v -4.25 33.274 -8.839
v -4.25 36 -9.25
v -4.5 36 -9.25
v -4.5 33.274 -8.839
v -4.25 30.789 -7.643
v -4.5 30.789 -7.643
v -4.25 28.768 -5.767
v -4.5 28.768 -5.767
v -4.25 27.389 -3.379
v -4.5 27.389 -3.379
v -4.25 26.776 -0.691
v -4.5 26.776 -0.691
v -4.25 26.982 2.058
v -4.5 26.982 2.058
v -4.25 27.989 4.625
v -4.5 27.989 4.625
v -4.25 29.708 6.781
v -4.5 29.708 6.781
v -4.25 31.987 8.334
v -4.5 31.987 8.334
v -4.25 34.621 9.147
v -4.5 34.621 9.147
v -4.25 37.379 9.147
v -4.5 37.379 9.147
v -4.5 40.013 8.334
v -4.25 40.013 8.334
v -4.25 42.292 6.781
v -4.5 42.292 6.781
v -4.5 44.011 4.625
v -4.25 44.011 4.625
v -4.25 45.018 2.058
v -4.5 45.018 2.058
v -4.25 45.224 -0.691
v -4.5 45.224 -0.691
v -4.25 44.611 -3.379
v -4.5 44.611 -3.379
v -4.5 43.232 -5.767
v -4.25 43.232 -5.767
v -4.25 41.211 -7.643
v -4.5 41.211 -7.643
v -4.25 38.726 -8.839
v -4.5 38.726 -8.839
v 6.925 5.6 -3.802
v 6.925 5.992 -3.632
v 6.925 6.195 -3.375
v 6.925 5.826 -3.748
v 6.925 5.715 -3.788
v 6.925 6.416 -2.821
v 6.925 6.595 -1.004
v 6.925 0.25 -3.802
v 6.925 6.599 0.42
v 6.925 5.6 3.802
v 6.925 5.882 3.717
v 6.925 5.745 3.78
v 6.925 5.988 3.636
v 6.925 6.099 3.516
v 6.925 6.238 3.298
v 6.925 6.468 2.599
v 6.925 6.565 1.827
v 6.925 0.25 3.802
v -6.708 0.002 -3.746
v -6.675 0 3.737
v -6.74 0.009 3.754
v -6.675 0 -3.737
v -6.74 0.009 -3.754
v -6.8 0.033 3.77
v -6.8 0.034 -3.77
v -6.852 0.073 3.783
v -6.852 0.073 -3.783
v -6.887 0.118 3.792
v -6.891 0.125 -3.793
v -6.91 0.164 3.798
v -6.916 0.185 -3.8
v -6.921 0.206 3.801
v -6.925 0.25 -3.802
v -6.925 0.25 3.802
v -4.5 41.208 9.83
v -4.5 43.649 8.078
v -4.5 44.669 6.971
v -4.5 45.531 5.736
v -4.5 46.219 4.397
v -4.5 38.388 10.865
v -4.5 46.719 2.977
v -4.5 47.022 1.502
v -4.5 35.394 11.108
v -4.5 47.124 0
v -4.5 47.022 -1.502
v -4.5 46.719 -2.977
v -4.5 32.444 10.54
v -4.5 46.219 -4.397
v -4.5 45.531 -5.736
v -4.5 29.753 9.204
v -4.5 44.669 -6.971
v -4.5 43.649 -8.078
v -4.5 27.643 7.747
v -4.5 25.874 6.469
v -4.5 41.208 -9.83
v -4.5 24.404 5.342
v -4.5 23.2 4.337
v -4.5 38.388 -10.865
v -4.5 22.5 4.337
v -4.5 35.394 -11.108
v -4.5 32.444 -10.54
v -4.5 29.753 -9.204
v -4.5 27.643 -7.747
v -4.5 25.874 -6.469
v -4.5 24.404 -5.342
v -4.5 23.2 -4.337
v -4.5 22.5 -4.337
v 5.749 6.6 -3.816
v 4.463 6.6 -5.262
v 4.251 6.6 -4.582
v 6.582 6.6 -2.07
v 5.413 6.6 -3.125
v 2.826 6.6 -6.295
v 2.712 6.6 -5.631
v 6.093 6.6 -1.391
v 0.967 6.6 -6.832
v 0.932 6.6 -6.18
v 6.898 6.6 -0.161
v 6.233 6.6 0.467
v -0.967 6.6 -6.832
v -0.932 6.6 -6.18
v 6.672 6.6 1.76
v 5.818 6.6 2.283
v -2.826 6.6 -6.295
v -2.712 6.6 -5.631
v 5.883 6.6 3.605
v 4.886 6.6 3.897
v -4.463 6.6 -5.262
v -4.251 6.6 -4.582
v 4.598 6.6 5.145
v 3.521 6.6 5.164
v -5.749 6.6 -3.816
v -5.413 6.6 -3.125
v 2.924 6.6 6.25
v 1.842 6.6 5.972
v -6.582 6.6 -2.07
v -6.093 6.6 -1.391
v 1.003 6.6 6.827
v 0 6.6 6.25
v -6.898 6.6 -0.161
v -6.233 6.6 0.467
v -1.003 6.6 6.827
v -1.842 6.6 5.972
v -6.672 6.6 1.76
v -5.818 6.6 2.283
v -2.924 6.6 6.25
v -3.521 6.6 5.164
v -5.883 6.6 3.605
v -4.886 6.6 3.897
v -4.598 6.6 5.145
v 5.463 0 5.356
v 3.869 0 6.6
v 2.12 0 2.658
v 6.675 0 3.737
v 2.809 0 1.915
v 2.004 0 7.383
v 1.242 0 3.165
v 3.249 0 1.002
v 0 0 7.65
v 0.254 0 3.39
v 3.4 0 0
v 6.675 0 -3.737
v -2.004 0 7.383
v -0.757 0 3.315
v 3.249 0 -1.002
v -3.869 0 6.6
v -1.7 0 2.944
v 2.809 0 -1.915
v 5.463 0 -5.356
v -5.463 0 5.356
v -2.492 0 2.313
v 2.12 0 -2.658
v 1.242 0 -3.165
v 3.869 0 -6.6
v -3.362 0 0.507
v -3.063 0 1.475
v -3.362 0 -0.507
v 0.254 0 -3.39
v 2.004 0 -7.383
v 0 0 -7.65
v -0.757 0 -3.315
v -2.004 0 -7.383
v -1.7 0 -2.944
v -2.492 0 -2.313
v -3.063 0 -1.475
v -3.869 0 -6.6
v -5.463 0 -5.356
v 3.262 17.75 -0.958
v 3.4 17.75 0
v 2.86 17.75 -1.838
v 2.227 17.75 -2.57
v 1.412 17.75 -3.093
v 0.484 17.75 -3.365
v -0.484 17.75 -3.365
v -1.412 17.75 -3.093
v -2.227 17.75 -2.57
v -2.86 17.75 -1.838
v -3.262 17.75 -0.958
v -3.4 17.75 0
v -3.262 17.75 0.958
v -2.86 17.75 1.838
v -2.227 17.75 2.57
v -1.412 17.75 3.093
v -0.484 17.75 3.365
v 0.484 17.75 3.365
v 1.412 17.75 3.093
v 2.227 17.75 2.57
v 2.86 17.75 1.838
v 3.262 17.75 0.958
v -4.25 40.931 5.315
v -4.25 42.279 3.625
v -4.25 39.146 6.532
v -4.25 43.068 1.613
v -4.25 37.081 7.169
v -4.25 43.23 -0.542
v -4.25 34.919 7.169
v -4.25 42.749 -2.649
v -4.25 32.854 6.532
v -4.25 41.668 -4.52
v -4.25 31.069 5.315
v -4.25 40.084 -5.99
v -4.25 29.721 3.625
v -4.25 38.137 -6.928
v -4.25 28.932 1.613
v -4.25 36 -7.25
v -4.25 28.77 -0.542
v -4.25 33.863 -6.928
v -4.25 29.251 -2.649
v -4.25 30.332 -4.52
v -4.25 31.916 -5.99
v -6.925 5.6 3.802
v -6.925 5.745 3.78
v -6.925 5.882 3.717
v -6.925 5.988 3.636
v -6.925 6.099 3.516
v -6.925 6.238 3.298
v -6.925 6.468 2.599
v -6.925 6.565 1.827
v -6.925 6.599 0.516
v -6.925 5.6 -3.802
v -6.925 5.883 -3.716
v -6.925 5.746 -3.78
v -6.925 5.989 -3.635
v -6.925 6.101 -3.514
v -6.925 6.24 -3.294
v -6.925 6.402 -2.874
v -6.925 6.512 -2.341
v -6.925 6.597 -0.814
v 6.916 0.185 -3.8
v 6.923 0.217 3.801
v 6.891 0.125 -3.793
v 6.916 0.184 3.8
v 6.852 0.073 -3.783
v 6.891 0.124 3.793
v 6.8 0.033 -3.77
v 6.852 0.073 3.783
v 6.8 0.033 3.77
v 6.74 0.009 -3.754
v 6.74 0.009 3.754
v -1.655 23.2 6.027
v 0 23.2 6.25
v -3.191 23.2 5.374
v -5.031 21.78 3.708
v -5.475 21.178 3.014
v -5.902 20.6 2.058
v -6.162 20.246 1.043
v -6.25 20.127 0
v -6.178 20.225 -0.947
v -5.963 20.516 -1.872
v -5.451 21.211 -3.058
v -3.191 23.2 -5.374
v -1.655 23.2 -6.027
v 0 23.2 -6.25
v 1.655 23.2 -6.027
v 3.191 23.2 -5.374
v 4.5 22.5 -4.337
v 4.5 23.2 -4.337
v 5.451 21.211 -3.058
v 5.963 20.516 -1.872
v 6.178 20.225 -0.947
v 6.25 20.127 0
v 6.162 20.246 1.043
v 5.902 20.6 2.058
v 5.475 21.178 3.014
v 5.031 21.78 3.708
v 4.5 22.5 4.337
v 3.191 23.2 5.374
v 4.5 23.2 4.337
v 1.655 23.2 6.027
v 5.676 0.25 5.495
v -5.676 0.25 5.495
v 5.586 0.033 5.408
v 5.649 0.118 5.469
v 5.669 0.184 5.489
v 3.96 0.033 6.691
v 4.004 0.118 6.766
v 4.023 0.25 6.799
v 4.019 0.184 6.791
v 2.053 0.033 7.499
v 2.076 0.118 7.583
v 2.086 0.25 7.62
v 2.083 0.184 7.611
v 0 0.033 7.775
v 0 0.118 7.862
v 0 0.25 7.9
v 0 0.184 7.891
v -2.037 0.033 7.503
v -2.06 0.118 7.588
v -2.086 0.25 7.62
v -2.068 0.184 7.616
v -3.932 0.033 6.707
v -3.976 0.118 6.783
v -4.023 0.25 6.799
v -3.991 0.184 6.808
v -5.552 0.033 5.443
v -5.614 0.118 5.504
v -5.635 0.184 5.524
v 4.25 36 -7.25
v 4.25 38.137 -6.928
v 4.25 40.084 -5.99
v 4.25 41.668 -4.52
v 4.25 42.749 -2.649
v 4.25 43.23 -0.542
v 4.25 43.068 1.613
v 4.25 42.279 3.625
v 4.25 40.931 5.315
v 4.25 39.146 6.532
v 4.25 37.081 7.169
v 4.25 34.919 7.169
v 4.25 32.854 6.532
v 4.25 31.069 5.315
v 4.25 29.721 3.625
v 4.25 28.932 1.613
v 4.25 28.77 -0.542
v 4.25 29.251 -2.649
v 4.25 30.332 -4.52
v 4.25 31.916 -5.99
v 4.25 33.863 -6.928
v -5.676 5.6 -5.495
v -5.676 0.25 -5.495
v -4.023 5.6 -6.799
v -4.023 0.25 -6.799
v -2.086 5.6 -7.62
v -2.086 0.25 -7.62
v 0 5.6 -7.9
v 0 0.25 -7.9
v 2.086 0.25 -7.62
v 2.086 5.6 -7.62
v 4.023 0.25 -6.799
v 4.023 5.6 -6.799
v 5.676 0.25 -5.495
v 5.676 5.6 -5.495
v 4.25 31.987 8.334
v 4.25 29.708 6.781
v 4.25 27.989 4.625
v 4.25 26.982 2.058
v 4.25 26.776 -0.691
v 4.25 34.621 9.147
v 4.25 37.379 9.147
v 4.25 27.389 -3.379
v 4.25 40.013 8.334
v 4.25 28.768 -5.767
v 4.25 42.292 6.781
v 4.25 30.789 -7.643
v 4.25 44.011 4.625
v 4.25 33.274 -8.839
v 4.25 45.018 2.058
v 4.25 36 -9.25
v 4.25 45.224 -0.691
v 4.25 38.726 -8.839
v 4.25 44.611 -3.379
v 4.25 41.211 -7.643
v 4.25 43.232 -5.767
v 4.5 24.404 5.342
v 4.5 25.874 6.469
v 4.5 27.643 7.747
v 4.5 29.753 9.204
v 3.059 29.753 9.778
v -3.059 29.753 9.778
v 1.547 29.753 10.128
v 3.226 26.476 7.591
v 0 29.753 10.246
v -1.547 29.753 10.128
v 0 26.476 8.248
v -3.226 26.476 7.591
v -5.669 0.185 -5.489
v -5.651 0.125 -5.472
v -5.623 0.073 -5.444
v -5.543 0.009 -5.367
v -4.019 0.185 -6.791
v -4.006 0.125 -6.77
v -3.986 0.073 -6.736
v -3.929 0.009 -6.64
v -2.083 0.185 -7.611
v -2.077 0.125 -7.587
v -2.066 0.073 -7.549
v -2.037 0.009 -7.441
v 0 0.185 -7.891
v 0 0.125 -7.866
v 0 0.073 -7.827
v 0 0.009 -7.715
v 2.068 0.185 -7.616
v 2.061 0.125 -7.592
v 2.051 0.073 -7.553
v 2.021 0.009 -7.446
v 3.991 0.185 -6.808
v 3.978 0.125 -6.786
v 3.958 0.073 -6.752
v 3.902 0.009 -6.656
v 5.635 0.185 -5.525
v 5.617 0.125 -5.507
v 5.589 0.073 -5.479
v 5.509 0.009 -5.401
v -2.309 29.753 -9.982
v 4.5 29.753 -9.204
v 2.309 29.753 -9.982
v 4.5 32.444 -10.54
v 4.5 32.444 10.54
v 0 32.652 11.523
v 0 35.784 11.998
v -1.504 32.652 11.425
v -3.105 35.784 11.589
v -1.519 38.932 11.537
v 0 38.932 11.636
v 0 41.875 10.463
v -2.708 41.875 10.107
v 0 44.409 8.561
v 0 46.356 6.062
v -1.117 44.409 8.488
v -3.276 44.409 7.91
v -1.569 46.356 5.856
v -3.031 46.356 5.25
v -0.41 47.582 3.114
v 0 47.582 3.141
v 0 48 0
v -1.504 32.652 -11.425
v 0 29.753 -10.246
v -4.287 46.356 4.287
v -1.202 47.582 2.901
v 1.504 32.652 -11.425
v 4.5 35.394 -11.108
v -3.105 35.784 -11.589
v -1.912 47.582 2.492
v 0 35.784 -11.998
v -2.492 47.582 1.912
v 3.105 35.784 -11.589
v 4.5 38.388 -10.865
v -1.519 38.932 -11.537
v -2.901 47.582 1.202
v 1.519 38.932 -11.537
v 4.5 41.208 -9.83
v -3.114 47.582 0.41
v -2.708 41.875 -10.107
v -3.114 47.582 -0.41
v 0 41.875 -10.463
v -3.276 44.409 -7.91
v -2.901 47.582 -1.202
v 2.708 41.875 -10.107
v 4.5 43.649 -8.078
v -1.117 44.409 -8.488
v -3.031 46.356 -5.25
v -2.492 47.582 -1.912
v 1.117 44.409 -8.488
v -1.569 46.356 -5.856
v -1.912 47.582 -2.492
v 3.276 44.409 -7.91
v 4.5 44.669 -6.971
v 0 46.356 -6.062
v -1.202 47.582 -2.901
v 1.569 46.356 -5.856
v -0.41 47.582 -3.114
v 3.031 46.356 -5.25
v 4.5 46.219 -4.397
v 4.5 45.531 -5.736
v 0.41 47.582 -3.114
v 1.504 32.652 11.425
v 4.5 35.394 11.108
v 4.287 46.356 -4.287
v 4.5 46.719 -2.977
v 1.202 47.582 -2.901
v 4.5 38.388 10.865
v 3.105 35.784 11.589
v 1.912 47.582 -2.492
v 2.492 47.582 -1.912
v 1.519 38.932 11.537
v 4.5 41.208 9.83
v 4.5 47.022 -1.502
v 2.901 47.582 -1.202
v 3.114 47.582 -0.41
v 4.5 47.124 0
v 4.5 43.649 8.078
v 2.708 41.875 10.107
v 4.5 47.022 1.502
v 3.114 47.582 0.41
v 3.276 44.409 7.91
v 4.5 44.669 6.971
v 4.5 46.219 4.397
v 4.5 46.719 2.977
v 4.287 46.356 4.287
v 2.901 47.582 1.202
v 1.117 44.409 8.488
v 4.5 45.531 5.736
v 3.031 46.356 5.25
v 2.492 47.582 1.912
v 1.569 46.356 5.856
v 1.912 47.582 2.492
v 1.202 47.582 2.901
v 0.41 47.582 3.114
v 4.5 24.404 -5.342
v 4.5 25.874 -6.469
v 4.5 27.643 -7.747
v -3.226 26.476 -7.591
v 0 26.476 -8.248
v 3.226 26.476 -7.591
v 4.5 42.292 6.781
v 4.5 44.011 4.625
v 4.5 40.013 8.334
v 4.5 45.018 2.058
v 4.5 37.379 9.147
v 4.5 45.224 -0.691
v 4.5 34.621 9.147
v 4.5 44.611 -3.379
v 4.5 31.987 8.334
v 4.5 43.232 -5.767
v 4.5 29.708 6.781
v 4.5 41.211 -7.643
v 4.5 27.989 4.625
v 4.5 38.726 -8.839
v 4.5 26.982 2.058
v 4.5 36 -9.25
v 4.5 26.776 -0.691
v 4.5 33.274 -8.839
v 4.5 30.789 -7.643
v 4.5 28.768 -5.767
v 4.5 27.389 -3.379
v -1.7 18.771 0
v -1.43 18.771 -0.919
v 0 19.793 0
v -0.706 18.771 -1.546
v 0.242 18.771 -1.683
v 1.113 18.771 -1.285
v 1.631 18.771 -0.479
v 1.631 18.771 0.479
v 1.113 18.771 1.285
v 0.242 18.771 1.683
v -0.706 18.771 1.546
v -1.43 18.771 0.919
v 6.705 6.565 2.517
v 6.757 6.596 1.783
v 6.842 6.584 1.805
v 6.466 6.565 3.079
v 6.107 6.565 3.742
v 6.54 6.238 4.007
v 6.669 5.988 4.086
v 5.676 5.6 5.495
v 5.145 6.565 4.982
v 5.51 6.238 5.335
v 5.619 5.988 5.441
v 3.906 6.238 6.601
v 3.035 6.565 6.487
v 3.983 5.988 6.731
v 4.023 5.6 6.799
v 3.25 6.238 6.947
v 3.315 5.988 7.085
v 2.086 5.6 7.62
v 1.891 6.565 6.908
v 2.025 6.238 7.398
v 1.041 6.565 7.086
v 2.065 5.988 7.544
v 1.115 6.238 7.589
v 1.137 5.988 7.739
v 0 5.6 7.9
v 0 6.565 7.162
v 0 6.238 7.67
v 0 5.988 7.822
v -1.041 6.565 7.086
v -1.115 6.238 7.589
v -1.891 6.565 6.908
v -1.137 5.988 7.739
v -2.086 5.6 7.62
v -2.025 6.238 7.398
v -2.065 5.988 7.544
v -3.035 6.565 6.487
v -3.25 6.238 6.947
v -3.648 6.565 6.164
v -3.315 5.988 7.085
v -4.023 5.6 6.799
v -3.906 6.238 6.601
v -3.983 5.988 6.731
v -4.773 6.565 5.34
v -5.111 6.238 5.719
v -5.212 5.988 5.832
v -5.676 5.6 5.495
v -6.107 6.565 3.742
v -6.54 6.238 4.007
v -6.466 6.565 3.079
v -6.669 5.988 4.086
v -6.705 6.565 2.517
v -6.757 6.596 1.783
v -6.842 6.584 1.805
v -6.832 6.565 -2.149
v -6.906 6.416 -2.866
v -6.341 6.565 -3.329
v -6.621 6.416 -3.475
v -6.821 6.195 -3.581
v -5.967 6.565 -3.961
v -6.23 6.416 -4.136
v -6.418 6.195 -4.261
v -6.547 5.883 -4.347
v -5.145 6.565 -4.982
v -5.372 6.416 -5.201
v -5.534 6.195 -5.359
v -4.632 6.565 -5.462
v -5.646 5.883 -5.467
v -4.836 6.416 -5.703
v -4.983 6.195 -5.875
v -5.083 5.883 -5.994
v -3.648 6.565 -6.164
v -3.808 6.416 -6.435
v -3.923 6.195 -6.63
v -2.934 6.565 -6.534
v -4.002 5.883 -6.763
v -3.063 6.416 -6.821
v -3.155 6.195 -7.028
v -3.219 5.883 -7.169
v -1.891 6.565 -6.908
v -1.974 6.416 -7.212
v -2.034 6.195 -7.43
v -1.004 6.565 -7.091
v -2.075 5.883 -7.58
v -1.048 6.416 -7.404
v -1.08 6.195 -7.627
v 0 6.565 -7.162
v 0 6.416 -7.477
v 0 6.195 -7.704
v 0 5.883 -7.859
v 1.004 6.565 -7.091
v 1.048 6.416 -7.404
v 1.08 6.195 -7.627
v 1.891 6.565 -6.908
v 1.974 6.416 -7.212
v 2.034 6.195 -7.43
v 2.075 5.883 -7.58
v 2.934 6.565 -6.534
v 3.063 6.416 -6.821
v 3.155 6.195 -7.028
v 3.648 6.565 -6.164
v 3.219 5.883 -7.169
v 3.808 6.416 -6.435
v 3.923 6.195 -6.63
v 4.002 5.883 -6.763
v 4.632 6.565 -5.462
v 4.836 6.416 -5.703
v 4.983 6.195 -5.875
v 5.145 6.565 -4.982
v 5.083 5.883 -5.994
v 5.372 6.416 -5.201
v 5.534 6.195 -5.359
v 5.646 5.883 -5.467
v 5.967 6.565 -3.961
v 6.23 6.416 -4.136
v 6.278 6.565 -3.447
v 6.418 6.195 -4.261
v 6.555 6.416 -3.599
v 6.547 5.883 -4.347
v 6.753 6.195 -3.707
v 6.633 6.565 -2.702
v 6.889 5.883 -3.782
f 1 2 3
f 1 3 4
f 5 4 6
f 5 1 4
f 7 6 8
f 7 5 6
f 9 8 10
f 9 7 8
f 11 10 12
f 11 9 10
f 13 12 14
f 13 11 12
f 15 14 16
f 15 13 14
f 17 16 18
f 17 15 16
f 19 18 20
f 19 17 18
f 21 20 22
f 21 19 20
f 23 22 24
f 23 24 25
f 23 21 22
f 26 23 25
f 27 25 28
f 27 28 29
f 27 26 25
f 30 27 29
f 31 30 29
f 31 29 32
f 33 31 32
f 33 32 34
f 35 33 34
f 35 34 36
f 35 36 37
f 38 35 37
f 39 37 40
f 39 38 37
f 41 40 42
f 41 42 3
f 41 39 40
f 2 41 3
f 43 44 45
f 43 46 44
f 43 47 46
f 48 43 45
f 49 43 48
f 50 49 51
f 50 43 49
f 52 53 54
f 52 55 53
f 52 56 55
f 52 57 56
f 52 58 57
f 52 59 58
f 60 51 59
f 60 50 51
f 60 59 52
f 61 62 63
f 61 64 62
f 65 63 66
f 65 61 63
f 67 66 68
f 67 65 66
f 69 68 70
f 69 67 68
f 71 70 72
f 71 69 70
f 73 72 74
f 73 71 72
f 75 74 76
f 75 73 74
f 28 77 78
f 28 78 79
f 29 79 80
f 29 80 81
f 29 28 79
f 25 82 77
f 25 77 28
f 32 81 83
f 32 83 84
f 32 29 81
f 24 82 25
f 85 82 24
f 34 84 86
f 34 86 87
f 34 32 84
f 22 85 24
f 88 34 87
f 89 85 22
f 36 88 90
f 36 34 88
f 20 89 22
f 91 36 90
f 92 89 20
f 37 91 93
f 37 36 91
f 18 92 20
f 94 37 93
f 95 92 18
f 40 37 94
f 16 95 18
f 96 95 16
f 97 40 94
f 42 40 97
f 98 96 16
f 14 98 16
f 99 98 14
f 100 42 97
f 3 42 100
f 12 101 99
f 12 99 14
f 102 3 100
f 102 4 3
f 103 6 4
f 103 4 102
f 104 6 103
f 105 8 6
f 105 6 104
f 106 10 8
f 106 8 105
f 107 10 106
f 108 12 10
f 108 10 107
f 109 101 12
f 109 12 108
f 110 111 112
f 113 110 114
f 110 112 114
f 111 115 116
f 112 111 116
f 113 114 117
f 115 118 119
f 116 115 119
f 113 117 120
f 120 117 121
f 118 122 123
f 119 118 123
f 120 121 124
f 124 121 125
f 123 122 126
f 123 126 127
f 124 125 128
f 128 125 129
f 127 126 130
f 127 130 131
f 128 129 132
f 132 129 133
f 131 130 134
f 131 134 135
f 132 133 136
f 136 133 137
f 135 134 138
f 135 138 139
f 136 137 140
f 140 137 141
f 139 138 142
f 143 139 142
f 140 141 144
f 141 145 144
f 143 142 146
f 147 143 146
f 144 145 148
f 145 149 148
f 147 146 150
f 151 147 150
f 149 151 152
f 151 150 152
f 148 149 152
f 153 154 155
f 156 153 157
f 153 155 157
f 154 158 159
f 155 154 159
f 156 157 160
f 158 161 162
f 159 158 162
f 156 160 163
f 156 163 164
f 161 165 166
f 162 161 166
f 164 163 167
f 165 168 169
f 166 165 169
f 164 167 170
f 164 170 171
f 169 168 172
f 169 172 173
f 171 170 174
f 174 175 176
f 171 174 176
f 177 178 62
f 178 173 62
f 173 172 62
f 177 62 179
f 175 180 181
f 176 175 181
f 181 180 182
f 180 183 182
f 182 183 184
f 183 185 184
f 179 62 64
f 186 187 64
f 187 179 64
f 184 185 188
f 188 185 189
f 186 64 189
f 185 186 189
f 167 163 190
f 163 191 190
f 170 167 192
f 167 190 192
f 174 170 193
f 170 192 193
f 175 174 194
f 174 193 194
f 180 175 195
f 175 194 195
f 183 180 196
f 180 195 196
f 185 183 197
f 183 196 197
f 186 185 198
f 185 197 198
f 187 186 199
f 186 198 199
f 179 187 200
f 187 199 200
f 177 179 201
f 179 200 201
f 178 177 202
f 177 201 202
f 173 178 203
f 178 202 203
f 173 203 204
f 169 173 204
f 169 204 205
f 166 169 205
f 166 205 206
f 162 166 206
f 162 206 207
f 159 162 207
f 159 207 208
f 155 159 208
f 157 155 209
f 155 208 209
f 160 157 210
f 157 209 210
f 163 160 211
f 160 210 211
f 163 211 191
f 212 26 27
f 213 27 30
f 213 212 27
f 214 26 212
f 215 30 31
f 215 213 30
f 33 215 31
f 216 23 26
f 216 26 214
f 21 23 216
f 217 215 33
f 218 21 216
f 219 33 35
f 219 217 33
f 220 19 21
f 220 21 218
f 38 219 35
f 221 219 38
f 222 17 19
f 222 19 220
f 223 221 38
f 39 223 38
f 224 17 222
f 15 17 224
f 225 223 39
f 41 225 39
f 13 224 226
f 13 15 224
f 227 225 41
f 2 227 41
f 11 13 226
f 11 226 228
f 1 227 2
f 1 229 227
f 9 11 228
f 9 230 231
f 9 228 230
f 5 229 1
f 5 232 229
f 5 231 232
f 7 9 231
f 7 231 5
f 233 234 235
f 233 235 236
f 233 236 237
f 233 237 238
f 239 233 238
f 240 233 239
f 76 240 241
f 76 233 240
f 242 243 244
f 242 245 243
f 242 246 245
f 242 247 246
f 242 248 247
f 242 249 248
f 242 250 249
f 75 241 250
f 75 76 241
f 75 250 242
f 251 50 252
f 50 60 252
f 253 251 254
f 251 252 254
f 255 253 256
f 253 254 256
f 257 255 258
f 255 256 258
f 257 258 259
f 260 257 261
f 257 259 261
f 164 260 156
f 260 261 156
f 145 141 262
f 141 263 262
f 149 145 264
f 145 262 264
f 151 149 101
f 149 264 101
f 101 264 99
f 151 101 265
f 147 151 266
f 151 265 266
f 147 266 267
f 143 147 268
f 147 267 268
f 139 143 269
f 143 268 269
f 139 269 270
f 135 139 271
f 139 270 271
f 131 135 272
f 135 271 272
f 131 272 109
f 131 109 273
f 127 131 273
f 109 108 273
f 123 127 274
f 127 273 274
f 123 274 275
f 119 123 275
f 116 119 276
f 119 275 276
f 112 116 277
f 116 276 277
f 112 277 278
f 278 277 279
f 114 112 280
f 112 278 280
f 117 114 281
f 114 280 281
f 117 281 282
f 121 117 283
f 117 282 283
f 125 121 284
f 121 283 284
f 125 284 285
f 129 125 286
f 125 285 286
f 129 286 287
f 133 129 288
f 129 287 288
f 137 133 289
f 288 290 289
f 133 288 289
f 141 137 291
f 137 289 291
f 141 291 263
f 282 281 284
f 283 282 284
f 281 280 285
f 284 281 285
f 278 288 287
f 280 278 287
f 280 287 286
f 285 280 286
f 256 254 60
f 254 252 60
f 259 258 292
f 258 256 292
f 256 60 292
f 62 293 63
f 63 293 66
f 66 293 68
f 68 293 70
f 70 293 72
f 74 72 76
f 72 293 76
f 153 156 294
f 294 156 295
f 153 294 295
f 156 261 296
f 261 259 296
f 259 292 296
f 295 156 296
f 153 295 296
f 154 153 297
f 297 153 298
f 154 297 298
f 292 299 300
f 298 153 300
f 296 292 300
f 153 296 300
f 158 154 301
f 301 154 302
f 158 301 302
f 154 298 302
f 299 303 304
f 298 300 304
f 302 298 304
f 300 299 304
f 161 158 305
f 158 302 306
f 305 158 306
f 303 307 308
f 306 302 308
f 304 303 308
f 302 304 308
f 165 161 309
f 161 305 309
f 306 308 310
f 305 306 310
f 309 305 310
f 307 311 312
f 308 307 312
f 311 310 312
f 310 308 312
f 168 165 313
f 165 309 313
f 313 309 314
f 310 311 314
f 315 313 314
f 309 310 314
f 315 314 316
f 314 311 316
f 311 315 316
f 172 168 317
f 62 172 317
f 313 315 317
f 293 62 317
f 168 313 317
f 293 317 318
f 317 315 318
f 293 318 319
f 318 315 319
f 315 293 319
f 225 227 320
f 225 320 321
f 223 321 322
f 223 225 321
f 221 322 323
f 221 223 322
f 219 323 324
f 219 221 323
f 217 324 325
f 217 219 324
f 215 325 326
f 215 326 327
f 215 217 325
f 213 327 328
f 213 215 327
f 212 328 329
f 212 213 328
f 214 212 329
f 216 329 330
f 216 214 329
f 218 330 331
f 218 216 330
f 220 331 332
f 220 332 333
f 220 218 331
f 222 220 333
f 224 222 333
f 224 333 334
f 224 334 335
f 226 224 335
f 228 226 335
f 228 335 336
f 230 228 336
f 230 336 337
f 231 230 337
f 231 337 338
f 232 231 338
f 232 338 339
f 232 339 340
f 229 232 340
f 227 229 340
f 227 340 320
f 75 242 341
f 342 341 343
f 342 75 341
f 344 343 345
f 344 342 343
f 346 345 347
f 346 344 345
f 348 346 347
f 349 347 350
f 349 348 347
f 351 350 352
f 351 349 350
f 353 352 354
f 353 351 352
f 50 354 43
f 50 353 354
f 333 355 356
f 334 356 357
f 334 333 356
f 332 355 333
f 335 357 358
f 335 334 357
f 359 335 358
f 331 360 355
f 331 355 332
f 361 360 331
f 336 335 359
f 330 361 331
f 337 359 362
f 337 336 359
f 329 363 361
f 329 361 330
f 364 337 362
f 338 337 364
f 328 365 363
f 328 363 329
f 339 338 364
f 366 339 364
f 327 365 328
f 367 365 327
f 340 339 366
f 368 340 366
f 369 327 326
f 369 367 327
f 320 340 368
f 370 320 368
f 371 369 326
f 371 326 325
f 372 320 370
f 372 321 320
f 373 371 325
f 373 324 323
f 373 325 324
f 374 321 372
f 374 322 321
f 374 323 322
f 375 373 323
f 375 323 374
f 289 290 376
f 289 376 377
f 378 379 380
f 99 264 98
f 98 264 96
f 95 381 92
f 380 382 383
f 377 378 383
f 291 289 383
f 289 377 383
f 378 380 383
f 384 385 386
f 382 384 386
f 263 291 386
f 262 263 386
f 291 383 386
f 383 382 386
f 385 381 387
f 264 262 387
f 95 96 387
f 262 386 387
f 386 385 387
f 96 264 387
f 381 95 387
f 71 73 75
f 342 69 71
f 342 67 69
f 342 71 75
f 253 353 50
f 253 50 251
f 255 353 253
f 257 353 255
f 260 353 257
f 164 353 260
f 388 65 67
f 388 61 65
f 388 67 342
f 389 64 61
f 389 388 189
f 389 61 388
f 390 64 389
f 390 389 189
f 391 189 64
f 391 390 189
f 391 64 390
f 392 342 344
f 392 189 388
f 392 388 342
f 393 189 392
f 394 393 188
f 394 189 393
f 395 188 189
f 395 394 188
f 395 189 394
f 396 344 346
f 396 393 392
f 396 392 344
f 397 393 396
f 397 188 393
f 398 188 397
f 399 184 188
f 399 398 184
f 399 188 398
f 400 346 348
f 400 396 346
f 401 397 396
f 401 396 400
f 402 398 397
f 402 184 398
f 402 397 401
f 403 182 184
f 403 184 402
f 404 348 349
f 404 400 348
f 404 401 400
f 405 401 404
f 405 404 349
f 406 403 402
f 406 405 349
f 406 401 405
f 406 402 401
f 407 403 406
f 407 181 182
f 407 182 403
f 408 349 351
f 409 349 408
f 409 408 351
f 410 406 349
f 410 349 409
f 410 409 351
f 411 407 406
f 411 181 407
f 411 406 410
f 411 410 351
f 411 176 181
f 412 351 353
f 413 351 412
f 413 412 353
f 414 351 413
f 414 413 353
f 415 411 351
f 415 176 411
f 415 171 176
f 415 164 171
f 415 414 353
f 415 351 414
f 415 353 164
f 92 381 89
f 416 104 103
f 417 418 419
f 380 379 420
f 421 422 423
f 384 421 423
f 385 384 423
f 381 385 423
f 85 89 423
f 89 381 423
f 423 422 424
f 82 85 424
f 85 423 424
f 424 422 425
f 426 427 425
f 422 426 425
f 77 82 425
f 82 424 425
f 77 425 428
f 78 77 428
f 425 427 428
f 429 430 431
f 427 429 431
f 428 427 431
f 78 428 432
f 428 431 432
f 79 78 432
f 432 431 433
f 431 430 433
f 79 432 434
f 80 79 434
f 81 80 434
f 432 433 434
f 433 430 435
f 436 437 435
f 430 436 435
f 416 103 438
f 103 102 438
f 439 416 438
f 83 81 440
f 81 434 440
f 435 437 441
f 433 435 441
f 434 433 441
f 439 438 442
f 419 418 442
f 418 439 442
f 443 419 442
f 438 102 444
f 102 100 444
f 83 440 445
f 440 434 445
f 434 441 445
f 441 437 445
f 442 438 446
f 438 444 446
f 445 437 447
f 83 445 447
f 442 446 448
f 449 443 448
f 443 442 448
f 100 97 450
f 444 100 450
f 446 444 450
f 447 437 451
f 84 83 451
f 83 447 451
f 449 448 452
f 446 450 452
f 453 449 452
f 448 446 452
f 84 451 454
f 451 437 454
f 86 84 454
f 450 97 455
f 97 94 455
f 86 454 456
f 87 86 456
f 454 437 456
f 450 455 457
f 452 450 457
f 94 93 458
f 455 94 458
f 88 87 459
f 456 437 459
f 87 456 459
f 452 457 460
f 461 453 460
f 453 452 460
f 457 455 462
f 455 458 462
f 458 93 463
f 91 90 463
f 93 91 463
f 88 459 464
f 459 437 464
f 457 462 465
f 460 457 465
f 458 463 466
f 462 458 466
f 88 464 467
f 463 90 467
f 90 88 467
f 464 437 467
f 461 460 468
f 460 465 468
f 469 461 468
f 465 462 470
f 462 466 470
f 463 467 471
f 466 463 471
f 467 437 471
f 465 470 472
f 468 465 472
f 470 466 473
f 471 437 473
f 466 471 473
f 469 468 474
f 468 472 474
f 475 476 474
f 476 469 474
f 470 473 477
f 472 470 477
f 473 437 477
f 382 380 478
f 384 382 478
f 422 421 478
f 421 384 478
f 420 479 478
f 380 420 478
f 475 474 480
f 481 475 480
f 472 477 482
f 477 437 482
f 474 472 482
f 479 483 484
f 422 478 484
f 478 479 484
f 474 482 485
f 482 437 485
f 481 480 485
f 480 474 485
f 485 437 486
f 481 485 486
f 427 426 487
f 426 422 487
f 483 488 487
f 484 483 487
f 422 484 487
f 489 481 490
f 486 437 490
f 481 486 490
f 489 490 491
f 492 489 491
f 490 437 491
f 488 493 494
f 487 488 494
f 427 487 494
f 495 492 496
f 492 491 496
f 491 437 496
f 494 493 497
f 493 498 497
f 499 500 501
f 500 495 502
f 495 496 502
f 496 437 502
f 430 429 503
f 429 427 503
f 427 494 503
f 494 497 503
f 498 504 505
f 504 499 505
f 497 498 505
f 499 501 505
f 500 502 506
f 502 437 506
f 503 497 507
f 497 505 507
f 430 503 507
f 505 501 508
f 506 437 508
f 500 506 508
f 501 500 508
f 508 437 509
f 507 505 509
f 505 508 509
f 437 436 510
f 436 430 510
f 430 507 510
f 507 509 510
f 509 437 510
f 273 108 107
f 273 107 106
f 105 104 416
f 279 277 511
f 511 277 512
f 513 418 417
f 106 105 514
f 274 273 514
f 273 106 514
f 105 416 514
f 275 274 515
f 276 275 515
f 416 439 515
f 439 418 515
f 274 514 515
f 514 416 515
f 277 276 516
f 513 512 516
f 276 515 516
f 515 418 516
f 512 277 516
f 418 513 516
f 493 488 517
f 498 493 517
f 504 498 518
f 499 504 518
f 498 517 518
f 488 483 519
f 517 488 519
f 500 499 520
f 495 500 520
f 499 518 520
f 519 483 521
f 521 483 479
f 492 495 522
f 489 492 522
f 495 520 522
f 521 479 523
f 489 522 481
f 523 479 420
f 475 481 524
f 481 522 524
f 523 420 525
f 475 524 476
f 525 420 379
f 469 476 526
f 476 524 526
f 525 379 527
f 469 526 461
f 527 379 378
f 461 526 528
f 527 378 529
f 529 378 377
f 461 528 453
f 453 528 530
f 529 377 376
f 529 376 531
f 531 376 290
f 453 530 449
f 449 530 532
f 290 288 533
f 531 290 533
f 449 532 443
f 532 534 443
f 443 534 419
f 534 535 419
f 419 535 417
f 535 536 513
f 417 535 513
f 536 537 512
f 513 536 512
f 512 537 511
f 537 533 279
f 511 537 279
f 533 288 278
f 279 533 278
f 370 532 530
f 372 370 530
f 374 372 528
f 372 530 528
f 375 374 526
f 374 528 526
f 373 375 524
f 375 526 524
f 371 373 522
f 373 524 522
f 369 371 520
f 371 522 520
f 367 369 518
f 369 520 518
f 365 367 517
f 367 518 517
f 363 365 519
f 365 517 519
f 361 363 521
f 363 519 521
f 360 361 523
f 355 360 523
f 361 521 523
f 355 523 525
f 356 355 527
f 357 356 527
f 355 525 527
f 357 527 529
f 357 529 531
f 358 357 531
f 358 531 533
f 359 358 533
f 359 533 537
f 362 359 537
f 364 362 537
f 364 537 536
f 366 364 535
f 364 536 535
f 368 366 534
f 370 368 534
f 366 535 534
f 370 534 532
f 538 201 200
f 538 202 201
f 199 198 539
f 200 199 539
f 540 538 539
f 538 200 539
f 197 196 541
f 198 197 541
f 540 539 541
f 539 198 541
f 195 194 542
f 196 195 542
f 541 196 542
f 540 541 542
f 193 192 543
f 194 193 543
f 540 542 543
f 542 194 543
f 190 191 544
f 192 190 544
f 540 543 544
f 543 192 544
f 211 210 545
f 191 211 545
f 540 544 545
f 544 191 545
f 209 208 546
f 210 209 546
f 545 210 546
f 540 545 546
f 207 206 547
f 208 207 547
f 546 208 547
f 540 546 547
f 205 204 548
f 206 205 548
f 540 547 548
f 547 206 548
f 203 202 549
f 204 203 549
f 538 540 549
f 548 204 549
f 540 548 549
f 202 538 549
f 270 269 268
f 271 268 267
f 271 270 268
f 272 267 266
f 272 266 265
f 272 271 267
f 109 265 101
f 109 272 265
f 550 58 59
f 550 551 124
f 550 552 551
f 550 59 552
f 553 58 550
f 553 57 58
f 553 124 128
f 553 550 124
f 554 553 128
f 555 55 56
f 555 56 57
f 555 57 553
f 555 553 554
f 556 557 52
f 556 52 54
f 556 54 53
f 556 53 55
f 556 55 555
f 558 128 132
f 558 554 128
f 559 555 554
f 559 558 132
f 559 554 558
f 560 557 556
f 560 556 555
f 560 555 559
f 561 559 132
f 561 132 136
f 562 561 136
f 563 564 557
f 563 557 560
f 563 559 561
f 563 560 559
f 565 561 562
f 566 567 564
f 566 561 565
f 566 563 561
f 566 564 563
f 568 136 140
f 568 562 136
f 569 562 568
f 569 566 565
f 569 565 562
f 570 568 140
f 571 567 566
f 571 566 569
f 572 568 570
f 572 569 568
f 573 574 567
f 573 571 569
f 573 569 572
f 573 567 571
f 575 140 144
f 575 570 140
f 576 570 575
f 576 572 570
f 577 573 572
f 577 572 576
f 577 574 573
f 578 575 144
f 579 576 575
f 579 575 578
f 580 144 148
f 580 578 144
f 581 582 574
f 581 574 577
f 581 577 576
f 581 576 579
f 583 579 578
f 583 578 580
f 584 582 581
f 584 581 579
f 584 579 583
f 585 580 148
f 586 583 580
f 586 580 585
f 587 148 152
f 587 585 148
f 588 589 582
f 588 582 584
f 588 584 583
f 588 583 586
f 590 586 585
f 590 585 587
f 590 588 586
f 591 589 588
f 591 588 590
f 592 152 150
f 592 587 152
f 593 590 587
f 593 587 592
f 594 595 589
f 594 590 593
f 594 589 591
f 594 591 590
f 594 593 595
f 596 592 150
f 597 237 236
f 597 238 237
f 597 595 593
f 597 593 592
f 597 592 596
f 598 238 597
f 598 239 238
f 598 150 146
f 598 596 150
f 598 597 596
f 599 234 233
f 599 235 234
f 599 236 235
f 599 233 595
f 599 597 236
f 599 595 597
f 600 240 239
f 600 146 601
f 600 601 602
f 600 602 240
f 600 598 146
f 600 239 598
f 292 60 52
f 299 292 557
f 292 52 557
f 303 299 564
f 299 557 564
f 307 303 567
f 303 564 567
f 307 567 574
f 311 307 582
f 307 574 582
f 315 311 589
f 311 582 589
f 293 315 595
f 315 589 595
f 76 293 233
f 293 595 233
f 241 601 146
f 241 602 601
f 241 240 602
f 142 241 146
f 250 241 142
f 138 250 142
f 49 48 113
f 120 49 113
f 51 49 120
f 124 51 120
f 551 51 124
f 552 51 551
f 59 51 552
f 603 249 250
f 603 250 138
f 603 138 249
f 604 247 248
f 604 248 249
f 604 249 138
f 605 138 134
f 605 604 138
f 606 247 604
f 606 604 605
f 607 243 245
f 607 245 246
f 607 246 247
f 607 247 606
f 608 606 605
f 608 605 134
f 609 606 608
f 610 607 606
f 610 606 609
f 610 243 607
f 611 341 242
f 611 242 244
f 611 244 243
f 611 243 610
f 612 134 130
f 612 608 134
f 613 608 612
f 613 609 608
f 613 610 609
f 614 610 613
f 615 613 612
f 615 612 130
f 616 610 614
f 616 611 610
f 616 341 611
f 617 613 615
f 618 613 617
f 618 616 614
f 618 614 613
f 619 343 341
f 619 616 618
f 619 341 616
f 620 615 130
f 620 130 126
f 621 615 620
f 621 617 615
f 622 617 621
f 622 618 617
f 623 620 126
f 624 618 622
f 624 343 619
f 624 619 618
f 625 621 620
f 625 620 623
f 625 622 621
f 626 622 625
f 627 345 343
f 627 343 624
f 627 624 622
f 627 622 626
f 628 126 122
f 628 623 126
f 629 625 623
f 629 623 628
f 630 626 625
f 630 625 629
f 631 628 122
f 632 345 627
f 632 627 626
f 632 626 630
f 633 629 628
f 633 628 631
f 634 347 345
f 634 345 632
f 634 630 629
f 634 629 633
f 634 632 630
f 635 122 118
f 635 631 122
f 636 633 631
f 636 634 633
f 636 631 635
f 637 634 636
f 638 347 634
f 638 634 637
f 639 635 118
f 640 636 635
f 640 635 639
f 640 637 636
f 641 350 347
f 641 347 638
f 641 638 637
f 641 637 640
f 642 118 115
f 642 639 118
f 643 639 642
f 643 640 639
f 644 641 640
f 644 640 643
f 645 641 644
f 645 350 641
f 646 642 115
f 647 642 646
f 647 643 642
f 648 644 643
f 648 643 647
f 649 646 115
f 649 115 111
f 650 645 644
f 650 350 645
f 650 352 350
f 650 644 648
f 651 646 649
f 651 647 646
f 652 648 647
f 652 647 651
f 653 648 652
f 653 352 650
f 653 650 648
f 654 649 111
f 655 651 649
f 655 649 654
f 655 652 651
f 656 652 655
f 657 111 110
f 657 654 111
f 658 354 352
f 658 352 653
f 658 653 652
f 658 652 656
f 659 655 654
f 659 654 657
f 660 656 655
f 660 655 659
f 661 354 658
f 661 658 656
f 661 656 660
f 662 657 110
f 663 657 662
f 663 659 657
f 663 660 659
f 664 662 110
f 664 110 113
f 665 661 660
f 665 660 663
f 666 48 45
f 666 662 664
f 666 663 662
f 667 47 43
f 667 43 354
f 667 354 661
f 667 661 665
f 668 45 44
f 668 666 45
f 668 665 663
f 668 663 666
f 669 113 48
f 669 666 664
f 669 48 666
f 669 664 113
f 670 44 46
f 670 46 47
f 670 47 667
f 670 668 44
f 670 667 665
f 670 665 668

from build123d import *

# Parameters (mm, degrees)
SKETCH2_OUTSIDE_W        = 37.758
SKETCH2_OUTSIDE_H        = 37.758
CUT_EXTRUDE1_DEPTH       = 6.6
SKETCH3_OUTSIDE_W        = 37.758
SKETCH3_OUTSIDE_H        = 37.758
SKETCH3_OUTSIDE_W_2      = 9
SKETCH3_OUTSIDE_H_2      = 24
CUT_EXTRUDE2_DEPTH       = 31.630866785
SKETCH4_R                = 9.25
SKETCH4_R_2              = 7.25
CUT_EXTRUDE3_DEPTH       = 0.25
CUT_EXTRUDE4_START       = -0.25
SKETCH5_R                = 9.25
SKETCH5_R_2              = 7.25
CUT_EXTRUDE4_DEPTH       = 0.25
DOME2_FACE_RADIUS        = 7.25
DOME2_HEIGHT             = 3.8
FILLET1_R                = 1
FILLET2_R                = 0.25
CUT_EXTRUDE10_DEPTH      = 10.2995
M8_TAPPED_HOLE1_D        = 6.8
M8_TAPPED_HOLE1_DEPTH    = 22.25
M8_TAPPED_HOLE1_TIP      = 2.042926105
CUT_EXTRUDE11_DEPTH      = 51.168615687
CUT_EXTRUDE11_DEPTH_BACK = 51.168615687
SKETCH6_R                = 7.25


# Read off the part's stored shape, not the designer's step: Dome1
with BuildPart() as part:
    # Sketch1 → Revolve1 (revolve)
    with BuildSketch(Plane(origin=(0, 0, 0), x_dir=(0, 0, -1), z_dir=(1, 0, 0)), mode=Mode.PRIVATE) as revolve1_sk:
        with BuildLine():
            Line((0, 0), (7.9, 0))
            Line((7.9, 0), (7.9, 6.6))
            Line((7.9, 6.6), (6.25, 6.6))
            Line((6.25, 6.6), (6.25, 23.2))
            Line((6.25, 23.2), (10.245555029, 29.752712416))
            ThreePointArc((10.245555029, 29.752712416), (10.463447114, 41.875055276), (0, 48))
            Line((0, 48), (0, 0))
        make_face()
    revolve(revolve1_sk.sketch.rotate(Axis((0, 48, 0), (0, -1, 0)), 180), axis=Axis((0, 48, 0), (0, -1, 0)))

    # Sketch2 outside → Cut-Extrude1 (cut)
    with BuildSketch(Plane(origin=(0, 0, 0), x_dir=(-1, 0, 0), z_dir=(0, -1, 0))):
        Rectangle(SKETCH2_OUTSIDE_W, SKETCH2_OUTSIDE_H)
        with BuildLine():
            Line((-6.925, 3.801890977), (-6.925, -3.801890977))
            ThreePointArc((-6.925, -3.801890977), (0, -7.9), (6.925, -3.801890977))
            Line((6.925, -3.801890977), (6.925, 3.801890977))
            ThreePointArc((6.925, 3.801890977), (0, 7.9), (-6.925, 3.801890977))
        make_face(mode=Mode.SUBTRACT)
    extrude(amount=-CUT_EXTRUDE1_DEPTH, mode=Mode.SUBTRACT)

    # Sketch3 outside → Cut-Extrude2 (cut, through all)
    with BuildSketch(Plane(origin=(0, 22.5, 0), x_dir=(-1, 0, 0), z_dir=(0, -1, 0))):
        Rectangle(SKETCH3_OUTSIDE_W, SKETCH3_OUTSIDE_H)
        Rectangle(SKETCH3_OUTSIDE_W_2, SKETCH3_OUTSIDE_H_2, mode=Mode.SUBTRACT)
    extrude(amount=-CUT_EXTRUDE2_DEPTH, mode=Mode.SUBTRACT)

    # Sketch4 → Cut-Extrude3 (cut)
    with BuildSketch(Plane(origin=(4.5, 0, 0), x_dir=(0, 0, -1), z_dir=(1, 0, 0))):
        with Locations((0, 36)):
            Circle(SKETCH4_R)
        with Locations((0, 36)):
            Circle(SKETCH4_R_2, mode=Mode.SUBTRACT)
    extrude(amount=-CUT_EXTRUDE3_DEPTH, mode=Mode.SUBTRACT)

    # Sketch5 → Cut-Extrude4 (cut)
    with BuildSketch(Plane.ZY.offset(4.5).offset(CUT_EXTRUDE4_START)):
        with Locations(Location((0, 36, 0), (0, 0, 180))):
            Circle(SKETCH5_R)
        with Locations(Location((0, 36, 0), (0, 0, 180))):
            Circle(SKETCH5_R_2, mode=Mode.SUBTRACT)
    extrude(amount=CUT_EXTRUDE4_DEPTH, mode=Mode.SUBTRACT)

    # Dome1 outline → Dome1 (revolve)
    with BuildSketch(Plane(origin=(0, 36, 0), x_dir=(0, 1, 0), z_dir=(0, 0, -1))):
        with BuildLine():
            Line((0, -4.499999993), (0, -8.3))
            ThreePointArc((0, -8.3), (4.092752745, -7.292422991), (7.250000005, -4.499999993))
            Line((7.250000005, -4.499999993), (0, -4.499999993))
        make_face()
    revolve(axis=Axis((0, 36, 0), (1, 0, 0)))

    # Dome2: a dome of height H over a round flat face of radius A is a cap of a sphere of radius (A * A + H * H) / (2 * H)
    dome2_r = (DOME2_FACE_RADIUS * DOME2_FACE_RADIUS + DOME2_HEIGHT * DOME2_HEIGHT) / (2 * DOME2_HEIGHT)
    dome2_base = Plane((4.5, 36, 0), z_dir=(1, 0, 0))
    with Locations(dome2_base.offset(DOME2_HEIGHT - dome2_r)):
        dome2_ball = Sphere(dome2_r, mode=Mode.PRIVATE)
    add(split(dome2_ball, bisect_by=dome2_base, keep=Keep.TOP, mode=Mode.PRIVATE))

    # Fillet1
    # the kernel refuses this fillet: 1 mm, written as the material it takes off along each edge
    with BuildSketch(Plane(origin=(0, 6.6, 0), x_dir=(-0.9669082627273712, 0, 0.25512430591681584), z_dir=(0.25512430591681584, 0, 0.9669082627273712))) as fillet1_piece_1:
        with BuildLine():
            CenterArc((7.9 - FILLET1_R, FILLET1_R), FILLET1_R, 270, 90)
            Line((7.9, FILLET1_R), (7.9 + FILLET1_R * 0.02, FILLET1_R))
            Line((7.9 + FILLET1_R * 0.02, FILLET1_R), (7.9 + FILLET1_R * 0.02, -FILLET1_R * 0.02))
            Line((7.9 + FILLET1_R * 0.02, -FILLET1_R * 0.02), (7.9 - FILLET1_R, -FILLET1_R * 0.02))
            Line((7.9 - FILLET1_R, -FILLET1_R * 0.02), (7.9 - FILLET1_R, 0))
        make_face()
    revolve(axis=Axis((0, 6.6, 0), (0, -1, 0)), revolution_arc=209.561901965, mode=Mode.SUBTRACT)
    with BuildSketch(Plane(origin=(0, 6.6, 0), x_dir=(-0.9669082627273712, 0, -0.2551243059168157), z_dir=(0.2551243059168157, 0, -0.9669082627273712))) as fillet1_piece_2:
        with BuildLine():
            CenterArc((7.9 - FILLET1_R, -FILLET1_R), FILLET1_R, 360, 90)
            Line((7.9, -FILLET1_R), (7.9 + FILLET1_R * 0.02, -FILLET1_R))
            Line((7.9 + FILLET1_R * 0.02, -FILLET1_R), (7.9 + FILLET1_R * 0.02, FILLET1_R * 0.02))
            Line((7.9 + FILLET1_R * 0.02, FILLET1_R * 0.02), (7.9 - FILLET1_R, FILLET1_R * 0.02))
            Line((7.9 - FILLET1_R, FILLET1_R * 0.02), (7.9 - FILLET1_R, 0))
        make_face()
    revolve(axis=Axis((0, 6.6, 0), (0, 1, 0)), revolution_arc=209.561901965, mode=Mode.SUBTRACT)

    # Fillet2
    fillet2_edges = [part.edges().sort_by_distance(p)[0] for p in [
        (0, 0, -7.9),
        (0, 0, 7.9),
        (6.925, 0, 0),
        (-6.925, 0, 0),
    ]]
    fillet(fillet2_edges, radius=FILLET2_R)

    # Sketch11 → Cut-Extrude10 (cut, symmetric)
    with BuildSketch(Plane(origin=(0, 0, 0), x_dir=(-1, 0, 0), z_dir=(0, 0, -1))):
        Polygon((-6.25, 22.5), (-4.5, 22.5), (-6.25, 20.127174391), align=None)
        Polygon((4.5, 22.5), (6.25, 22.5), (6.25, 20.127174391), align=None)
    extrude(amount=CUT_EXTRUDE10_DEPTH, both=True, mode=Mode.SUBTRACT)

    # M8 Tapped Hole1
    with Locations(Plane(origin=(0, -4.5, 0), x_dir=(-1, 0, 0), z_dir=(0, -1, 0))):
        with Locations((0, 0)):
            Hole(M8_TAPPED_HOLE1_D / 2, depth=M8_TAPPED_HOLE1_DEPTH)
            with Locations((0, 0, -(M8_TAPPED_HOLE1_DEPTH + M8_TAPPED_HOLE1_TIP / 2))):  # 118° drill point
                Cone(0, M8_TAPPED_HOLE1_D / 2, M8_TAPPED_HOLE1_TIP, mode=Mode.SUBTRACT)

    # Sketch6 → Cut-Extrude11 (cut, two sides: drawn at the far end of the back side and taken through both)
    with BuildSketch(Plane(origin=(0, 0, 0), x_dir=(0, 0, -1), z_dir=(1, 0, 0)).offset(-CUT_EXTRUDE11_DEPTH_BACK)):
        with Locations((0, 36)):
            Circle(SKETCH6_R)
    extrude(amount=CUT_EXTRUDE11_DEPTH + CUT_EXTRUDE11_DEPTH_BACK, mode=Mode.SUBTRACT)


solid = part.part
